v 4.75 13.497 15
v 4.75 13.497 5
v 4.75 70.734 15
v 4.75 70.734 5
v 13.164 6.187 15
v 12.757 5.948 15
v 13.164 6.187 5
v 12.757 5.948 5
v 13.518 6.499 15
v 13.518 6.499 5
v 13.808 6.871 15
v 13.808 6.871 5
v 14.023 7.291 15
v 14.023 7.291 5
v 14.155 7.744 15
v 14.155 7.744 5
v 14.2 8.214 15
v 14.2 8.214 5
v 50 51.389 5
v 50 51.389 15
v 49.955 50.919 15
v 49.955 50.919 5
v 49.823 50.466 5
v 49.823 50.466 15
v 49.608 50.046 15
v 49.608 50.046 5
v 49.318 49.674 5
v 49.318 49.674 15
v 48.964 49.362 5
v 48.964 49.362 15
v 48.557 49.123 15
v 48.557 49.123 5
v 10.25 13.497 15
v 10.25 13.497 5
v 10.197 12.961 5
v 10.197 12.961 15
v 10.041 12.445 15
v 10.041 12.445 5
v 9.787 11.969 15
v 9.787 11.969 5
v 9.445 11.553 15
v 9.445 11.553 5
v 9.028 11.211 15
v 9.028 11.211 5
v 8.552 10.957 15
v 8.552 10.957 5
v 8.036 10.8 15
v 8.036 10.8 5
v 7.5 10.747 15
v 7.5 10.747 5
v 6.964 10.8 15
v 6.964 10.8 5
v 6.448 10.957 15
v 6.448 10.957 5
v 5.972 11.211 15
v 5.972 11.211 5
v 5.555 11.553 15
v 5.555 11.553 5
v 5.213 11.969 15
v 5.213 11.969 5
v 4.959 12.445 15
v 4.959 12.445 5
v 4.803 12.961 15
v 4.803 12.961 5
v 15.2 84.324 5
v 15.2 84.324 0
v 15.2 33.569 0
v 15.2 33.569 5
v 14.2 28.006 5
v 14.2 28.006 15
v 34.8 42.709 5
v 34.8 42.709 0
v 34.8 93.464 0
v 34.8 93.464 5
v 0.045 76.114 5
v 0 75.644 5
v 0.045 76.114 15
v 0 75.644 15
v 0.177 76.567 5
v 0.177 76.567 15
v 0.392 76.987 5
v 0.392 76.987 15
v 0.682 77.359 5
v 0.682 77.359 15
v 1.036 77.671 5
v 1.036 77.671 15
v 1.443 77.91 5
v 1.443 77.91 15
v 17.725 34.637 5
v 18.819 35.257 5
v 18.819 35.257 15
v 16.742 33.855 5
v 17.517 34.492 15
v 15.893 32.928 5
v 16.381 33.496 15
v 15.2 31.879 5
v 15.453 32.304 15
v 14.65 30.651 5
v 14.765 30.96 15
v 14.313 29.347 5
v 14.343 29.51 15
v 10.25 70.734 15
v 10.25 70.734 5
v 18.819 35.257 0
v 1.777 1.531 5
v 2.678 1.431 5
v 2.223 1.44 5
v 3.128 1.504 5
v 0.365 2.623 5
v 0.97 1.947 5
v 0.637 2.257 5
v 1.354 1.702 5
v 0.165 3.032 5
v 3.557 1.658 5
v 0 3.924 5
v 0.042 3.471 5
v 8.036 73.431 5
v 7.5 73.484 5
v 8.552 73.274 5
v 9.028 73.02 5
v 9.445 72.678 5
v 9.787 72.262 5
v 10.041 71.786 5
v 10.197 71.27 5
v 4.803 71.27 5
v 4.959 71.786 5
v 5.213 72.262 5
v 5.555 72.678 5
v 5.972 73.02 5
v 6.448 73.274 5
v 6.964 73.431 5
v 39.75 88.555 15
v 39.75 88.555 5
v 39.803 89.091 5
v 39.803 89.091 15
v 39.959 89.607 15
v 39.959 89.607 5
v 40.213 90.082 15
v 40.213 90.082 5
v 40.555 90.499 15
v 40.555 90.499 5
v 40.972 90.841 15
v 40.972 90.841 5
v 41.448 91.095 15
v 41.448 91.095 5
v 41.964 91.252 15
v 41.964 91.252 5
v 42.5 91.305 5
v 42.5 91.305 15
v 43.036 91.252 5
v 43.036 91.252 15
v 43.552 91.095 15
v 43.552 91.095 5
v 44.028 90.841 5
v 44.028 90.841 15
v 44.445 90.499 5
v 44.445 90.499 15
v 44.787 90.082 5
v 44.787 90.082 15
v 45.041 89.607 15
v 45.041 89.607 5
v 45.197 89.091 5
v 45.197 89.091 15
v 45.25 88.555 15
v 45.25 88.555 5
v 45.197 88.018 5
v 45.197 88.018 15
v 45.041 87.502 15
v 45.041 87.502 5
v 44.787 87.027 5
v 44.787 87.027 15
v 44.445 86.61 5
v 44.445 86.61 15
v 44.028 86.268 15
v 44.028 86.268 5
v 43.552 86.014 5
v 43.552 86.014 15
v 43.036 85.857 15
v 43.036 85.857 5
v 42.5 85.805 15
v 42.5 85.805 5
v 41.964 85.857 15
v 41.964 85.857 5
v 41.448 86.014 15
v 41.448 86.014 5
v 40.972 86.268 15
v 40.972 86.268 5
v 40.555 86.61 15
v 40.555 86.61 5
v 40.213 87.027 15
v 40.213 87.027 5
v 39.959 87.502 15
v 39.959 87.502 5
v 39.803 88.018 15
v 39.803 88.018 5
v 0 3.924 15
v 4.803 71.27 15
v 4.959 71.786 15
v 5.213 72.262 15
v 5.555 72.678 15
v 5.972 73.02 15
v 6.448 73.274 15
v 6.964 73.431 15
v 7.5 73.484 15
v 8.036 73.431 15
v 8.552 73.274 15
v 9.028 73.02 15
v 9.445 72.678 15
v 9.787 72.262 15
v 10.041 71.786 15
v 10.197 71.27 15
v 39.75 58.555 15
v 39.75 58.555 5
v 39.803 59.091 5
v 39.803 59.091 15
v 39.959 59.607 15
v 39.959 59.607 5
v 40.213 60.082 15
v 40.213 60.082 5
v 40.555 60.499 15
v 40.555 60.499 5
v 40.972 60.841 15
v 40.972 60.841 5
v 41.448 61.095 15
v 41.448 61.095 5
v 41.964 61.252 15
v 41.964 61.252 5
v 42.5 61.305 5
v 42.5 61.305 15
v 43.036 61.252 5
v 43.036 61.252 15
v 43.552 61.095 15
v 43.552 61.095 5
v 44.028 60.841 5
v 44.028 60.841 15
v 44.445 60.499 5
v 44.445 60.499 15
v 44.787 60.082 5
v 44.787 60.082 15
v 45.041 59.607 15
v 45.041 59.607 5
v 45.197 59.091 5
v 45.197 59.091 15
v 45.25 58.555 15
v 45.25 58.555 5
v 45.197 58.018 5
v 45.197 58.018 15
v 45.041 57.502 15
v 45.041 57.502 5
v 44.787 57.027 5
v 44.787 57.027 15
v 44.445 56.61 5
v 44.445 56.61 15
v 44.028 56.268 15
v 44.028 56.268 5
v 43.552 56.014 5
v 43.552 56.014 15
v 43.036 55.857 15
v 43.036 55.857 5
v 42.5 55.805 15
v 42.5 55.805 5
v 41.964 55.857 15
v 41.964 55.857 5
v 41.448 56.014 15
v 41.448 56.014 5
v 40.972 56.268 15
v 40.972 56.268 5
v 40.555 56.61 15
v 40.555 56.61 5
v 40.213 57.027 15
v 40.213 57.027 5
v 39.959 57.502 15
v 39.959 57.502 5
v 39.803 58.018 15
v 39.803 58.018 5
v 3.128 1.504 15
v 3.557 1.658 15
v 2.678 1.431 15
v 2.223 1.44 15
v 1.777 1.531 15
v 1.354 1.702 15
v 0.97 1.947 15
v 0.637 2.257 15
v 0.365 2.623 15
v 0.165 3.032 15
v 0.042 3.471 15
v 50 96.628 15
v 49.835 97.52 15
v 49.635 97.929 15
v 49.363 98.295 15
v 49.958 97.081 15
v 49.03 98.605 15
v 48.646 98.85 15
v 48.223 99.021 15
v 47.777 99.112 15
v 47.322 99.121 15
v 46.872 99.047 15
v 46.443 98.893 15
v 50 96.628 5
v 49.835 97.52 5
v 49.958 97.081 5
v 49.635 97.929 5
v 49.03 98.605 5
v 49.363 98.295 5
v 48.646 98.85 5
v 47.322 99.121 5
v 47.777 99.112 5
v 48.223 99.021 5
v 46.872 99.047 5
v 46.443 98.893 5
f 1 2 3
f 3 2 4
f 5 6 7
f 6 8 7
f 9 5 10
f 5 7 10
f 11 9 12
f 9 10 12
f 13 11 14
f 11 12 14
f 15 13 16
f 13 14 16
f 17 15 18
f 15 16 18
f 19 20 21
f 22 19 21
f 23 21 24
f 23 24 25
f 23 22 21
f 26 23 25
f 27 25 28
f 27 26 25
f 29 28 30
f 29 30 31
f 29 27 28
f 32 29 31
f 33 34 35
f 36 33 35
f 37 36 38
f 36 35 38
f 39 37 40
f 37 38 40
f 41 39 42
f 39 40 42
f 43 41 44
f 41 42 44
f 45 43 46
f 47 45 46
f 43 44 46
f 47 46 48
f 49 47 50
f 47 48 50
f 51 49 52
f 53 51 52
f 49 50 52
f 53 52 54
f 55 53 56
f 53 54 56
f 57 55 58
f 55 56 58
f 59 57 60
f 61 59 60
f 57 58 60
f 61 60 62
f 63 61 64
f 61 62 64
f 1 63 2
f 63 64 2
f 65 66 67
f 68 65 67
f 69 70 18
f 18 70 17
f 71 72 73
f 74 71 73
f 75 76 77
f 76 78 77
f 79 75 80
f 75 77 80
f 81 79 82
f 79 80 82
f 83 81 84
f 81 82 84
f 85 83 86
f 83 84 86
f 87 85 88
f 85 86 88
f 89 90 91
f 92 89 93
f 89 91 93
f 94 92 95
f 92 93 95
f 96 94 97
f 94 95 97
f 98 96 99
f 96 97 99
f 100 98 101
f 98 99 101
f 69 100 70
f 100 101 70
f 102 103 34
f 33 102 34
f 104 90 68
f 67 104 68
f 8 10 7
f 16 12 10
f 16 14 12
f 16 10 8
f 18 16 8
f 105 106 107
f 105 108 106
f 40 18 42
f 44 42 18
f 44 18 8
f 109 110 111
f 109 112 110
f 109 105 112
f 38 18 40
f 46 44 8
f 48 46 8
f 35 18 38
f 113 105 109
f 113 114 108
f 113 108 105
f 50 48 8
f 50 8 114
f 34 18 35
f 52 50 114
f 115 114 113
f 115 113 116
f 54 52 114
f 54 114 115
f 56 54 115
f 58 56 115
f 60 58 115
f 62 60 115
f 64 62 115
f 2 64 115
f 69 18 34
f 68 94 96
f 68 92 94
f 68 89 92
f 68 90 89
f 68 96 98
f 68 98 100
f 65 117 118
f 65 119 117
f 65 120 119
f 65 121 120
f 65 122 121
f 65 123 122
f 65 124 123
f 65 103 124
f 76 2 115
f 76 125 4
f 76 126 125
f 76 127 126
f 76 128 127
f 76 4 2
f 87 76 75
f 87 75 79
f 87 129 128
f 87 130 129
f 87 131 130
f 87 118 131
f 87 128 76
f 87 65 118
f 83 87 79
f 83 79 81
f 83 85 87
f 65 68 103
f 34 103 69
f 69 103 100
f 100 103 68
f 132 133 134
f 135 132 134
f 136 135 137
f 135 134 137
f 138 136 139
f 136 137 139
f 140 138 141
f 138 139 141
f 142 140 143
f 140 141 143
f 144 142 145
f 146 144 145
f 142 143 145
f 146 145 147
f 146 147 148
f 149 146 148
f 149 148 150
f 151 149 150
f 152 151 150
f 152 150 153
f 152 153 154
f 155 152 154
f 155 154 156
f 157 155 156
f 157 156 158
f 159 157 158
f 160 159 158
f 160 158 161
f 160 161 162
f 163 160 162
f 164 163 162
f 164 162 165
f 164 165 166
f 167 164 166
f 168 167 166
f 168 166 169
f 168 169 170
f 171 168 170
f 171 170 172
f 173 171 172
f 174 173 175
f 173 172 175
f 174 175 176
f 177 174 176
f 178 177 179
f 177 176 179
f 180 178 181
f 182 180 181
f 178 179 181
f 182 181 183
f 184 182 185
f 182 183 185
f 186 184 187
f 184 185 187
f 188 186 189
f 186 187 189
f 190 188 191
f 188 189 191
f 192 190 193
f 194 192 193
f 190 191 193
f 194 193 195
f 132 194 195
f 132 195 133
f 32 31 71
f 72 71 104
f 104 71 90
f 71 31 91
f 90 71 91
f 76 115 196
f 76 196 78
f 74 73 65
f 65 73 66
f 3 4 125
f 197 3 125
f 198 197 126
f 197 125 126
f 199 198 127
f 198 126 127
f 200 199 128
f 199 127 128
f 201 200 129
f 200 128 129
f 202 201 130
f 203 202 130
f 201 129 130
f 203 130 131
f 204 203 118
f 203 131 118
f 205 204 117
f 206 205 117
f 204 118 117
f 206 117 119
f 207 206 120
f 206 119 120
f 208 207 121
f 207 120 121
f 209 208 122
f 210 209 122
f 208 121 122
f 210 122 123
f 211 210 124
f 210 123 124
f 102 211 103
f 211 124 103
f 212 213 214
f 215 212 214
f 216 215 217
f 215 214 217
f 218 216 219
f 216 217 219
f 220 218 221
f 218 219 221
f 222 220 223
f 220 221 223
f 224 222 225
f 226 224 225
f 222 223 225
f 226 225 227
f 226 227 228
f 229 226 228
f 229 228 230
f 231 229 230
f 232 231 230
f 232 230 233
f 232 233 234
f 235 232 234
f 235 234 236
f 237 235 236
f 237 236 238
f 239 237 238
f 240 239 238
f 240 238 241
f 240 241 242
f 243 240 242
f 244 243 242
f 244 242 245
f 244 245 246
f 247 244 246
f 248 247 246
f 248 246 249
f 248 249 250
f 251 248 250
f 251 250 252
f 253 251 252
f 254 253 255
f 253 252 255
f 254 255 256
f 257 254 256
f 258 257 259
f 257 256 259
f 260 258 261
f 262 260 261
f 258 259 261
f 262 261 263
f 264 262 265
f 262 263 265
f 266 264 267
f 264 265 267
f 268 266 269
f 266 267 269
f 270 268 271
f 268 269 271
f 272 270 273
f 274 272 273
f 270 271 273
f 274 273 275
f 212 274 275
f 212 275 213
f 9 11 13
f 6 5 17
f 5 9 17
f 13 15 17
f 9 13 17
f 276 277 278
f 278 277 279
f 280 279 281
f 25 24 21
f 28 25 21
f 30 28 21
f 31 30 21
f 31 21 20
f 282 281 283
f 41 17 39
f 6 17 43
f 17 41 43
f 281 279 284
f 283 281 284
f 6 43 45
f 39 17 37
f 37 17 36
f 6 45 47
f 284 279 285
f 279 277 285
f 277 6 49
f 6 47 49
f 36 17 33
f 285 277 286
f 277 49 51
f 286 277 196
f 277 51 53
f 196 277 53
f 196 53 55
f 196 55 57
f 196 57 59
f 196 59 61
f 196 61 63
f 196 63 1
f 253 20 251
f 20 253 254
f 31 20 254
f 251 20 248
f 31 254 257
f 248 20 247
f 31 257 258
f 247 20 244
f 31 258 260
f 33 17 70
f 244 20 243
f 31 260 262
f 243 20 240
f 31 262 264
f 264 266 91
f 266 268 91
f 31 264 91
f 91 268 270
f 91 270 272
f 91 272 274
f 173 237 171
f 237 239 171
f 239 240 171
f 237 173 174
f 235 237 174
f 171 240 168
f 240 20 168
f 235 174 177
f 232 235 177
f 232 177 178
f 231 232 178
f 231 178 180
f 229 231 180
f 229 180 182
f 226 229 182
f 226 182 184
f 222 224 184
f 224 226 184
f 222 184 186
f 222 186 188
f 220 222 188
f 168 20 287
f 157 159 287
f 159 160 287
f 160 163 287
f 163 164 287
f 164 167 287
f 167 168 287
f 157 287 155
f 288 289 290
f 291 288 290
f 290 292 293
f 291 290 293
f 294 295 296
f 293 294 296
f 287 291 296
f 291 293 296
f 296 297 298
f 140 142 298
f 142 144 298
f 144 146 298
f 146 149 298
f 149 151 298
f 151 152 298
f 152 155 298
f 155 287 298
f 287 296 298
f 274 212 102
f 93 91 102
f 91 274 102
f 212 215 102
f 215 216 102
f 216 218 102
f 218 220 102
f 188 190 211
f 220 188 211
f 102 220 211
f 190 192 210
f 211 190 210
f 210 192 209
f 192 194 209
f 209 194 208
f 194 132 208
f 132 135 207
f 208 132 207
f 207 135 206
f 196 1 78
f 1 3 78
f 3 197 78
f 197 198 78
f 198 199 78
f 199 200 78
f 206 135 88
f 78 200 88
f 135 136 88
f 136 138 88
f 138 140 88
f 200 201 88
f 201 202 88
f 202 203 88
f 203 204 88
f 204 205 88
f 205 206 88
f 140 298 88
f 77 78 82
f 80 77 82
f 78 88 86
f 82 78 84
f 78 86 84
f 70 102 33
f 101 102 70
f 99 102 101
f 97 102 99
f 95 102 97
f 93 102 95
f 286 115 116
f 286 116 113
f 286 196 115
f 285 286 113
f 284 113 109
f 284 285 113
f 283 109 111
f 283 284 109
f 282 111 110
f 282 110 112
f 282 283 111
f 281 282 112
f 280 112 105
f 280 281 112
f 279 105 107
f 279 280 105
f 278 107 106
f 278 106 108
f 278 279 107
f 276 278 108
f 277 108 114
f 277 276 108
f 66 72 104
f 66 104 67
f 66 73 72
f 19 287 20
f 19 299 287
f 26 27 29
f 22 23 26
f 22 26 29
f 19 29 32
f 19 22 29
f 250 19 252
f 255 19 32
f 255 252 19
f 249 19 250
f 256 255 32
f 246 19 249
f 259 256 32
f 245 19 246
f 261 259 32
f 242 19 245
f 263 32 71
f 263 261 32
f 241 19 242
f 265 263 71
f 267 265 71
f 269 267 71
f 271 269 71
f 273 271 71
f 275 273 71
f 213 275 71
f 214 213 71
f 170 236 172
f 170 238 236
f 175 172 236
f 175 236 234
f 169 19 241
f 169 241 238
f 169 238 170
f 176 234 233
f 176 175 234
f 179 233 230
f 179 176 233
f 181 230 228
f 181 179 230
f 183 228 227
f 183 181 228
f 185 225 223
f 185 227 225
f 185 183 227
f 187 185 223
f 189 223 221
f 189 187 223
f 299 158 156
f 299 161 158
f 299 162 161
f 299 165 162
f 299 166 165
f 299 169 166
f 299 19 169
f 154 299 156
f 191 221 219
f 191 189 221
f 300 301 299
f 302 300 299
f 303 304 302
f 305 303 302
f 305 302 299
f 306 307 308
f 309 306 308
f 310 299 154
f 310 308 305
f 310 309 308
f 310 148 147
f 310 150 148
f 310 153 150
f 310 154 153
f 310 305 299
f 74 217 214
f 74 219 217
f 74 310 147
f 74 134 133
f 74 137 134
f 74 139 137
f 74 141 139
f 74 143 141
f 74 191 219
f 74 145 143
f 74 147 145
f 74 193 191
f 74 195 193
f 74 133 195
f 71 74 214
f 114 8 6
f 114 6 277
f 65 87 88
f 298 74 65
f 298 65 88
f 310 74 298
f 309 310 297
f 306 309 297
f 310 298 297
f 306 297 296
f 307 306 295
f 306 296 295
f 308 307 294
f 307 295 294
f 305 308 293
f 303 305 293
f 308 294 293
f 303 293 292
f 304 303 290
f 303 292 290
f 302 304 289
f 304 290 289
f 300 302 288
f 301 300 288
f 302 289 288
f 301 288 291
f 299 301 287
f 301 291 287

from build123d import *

# Parameters (mm, degrees)
BOSS_EXTRU_1_DEPTH      = 15
ESQUISSE4_OUTSIDE_W     = 74.658
ESQUISSE4_OUTSIDE_H     = 125.21
ENL_V_MAT_EXTRU_2_DEPTH = 5
ENL_V_MAT_EXTRU_3_DEPTH = 114.294624636
ENL_V_START             = -5
ENL_V_MAT_EXTRU_4_DEPTH = 5
CONG_1_R                = 2.5
D_GAGEMENT_M51_D        = 5.5


with BuildPart() as part:
    # Esquisse1 → Boss.-Extru.1 (new body)
    with BuildSketch(Plane.XY):
        Polygon((0, 0), (0, 77.236454327), (50, 100.551837235), (50, 23.315382908), align=None)
        with BuildLine():
            Line((4.75, 13.497307436), (4.75, 70.733761764))
            ThreePointArc((4.75, 70.733761764), (7.5, 73.483761764), (10.25, 70.733761764))
            Line((10.25, 70.733761764), (10.25, 13.497307436))
            ThreePointArc((10.25, 13.497307436), (7.5, 10.747307436), (4.75, 13.497307436))
        make_face(mode=Mode.SUBTRACT)
    extrude(amount=BOSS_EXTRU_1_DEPTH)

    # Esquisse4 outside → Enlèv. mat.-Extru.2 (cut)
    with BuildSketch(Plane(origin=(0, 0, 0), x_dir=(-1, 0, 0), z_dir=(0, 0, -1))):
        with Locations((-25, 50.276)):
            Rectangle(ESQUISSE4_OUTSIDE_W, ESQUISSE4_OUTSIDE_H)
        Polygon((-15.2, 84.324330731), (-15.2, 7.087876404), (-34.8, 16.227506504), (-34.8, 93.463960831), align=None, mode=Mode.SUBTRACT)
    extrude(amount=-ENL_V_MAT_EXTRU_2_DEPTH, mode=Mode.SUBTRACT)

    # Esquisse5 → Enlèv. mat.-Extru.3 (cut, through all)
    with BuildSketch(Plane.XY.offset(15)):
        with BuildLine():
            Line((50, 23.315382908), (50, 49.796452963))
            Line((50, 49.796452963), (18.819053906, 35.256539011))
            ThreePointArc((18.819053906, 35.256539011), (15.452868433, 32.304473581), (14.2, 28.006076714))
            Line((14.2, 28.006076714), (14.2, 6.621568746))
            Line((14.2, 6.621568746), (50, 23.315382908))
        make_face()
    extrude(amount=-ENL_V_MAT_EXTRU_3_DEPTH, mode=Mode.SUBTRACT)

    # Esquisse6 → Enlèv. mat.-Extru.4 (cut)
    with BuildSketch(Plane(origin=(0, 0, 0), x_dir=(-1, 0, 0), z_dir=(0, 0, -1)).offset(ENL_V_START)):
        with BuildLine():
            Line((-18.819053906, 35.256539011), (-15.2, 33.568946459))
            Line((-15.2, 33.568946459), (-15.2, 31.879060061))
            ThreePointArc((-15.2, 31.879060061), (-16.741717169, 33.854764476), (-18.819053906, 35.256539011))
        make_face()
    extrude(amount=ENL_V_MAT_EXTRU_4_DEPTH, mode=Mode.SUBTRACT)

    # Congé1
    cong_1_edges = [part.edges().sort_by_distance(p)[0] for p in [
        (0, 0, 10),
        (0, 77.236454327, 10),
        (50, 100.551837235, 10),
        (14.2, 6.621568746, 10),
        (50, 49.796452963, 10),
    ]]
    fillet(cong_1_edges, radius=CONG_1_R)

    # Dégagement M51 (through all)
    with Locations(Plane(origin=(42.5, 58.554529799, 15), x_dir=(1, 0, 0), z_dir=(0, 0, 1))):
        with Locations((0, 0), (0, 30)):
            Hole(D_GAGEMENT_M51_D / 2)


solid = part.part
